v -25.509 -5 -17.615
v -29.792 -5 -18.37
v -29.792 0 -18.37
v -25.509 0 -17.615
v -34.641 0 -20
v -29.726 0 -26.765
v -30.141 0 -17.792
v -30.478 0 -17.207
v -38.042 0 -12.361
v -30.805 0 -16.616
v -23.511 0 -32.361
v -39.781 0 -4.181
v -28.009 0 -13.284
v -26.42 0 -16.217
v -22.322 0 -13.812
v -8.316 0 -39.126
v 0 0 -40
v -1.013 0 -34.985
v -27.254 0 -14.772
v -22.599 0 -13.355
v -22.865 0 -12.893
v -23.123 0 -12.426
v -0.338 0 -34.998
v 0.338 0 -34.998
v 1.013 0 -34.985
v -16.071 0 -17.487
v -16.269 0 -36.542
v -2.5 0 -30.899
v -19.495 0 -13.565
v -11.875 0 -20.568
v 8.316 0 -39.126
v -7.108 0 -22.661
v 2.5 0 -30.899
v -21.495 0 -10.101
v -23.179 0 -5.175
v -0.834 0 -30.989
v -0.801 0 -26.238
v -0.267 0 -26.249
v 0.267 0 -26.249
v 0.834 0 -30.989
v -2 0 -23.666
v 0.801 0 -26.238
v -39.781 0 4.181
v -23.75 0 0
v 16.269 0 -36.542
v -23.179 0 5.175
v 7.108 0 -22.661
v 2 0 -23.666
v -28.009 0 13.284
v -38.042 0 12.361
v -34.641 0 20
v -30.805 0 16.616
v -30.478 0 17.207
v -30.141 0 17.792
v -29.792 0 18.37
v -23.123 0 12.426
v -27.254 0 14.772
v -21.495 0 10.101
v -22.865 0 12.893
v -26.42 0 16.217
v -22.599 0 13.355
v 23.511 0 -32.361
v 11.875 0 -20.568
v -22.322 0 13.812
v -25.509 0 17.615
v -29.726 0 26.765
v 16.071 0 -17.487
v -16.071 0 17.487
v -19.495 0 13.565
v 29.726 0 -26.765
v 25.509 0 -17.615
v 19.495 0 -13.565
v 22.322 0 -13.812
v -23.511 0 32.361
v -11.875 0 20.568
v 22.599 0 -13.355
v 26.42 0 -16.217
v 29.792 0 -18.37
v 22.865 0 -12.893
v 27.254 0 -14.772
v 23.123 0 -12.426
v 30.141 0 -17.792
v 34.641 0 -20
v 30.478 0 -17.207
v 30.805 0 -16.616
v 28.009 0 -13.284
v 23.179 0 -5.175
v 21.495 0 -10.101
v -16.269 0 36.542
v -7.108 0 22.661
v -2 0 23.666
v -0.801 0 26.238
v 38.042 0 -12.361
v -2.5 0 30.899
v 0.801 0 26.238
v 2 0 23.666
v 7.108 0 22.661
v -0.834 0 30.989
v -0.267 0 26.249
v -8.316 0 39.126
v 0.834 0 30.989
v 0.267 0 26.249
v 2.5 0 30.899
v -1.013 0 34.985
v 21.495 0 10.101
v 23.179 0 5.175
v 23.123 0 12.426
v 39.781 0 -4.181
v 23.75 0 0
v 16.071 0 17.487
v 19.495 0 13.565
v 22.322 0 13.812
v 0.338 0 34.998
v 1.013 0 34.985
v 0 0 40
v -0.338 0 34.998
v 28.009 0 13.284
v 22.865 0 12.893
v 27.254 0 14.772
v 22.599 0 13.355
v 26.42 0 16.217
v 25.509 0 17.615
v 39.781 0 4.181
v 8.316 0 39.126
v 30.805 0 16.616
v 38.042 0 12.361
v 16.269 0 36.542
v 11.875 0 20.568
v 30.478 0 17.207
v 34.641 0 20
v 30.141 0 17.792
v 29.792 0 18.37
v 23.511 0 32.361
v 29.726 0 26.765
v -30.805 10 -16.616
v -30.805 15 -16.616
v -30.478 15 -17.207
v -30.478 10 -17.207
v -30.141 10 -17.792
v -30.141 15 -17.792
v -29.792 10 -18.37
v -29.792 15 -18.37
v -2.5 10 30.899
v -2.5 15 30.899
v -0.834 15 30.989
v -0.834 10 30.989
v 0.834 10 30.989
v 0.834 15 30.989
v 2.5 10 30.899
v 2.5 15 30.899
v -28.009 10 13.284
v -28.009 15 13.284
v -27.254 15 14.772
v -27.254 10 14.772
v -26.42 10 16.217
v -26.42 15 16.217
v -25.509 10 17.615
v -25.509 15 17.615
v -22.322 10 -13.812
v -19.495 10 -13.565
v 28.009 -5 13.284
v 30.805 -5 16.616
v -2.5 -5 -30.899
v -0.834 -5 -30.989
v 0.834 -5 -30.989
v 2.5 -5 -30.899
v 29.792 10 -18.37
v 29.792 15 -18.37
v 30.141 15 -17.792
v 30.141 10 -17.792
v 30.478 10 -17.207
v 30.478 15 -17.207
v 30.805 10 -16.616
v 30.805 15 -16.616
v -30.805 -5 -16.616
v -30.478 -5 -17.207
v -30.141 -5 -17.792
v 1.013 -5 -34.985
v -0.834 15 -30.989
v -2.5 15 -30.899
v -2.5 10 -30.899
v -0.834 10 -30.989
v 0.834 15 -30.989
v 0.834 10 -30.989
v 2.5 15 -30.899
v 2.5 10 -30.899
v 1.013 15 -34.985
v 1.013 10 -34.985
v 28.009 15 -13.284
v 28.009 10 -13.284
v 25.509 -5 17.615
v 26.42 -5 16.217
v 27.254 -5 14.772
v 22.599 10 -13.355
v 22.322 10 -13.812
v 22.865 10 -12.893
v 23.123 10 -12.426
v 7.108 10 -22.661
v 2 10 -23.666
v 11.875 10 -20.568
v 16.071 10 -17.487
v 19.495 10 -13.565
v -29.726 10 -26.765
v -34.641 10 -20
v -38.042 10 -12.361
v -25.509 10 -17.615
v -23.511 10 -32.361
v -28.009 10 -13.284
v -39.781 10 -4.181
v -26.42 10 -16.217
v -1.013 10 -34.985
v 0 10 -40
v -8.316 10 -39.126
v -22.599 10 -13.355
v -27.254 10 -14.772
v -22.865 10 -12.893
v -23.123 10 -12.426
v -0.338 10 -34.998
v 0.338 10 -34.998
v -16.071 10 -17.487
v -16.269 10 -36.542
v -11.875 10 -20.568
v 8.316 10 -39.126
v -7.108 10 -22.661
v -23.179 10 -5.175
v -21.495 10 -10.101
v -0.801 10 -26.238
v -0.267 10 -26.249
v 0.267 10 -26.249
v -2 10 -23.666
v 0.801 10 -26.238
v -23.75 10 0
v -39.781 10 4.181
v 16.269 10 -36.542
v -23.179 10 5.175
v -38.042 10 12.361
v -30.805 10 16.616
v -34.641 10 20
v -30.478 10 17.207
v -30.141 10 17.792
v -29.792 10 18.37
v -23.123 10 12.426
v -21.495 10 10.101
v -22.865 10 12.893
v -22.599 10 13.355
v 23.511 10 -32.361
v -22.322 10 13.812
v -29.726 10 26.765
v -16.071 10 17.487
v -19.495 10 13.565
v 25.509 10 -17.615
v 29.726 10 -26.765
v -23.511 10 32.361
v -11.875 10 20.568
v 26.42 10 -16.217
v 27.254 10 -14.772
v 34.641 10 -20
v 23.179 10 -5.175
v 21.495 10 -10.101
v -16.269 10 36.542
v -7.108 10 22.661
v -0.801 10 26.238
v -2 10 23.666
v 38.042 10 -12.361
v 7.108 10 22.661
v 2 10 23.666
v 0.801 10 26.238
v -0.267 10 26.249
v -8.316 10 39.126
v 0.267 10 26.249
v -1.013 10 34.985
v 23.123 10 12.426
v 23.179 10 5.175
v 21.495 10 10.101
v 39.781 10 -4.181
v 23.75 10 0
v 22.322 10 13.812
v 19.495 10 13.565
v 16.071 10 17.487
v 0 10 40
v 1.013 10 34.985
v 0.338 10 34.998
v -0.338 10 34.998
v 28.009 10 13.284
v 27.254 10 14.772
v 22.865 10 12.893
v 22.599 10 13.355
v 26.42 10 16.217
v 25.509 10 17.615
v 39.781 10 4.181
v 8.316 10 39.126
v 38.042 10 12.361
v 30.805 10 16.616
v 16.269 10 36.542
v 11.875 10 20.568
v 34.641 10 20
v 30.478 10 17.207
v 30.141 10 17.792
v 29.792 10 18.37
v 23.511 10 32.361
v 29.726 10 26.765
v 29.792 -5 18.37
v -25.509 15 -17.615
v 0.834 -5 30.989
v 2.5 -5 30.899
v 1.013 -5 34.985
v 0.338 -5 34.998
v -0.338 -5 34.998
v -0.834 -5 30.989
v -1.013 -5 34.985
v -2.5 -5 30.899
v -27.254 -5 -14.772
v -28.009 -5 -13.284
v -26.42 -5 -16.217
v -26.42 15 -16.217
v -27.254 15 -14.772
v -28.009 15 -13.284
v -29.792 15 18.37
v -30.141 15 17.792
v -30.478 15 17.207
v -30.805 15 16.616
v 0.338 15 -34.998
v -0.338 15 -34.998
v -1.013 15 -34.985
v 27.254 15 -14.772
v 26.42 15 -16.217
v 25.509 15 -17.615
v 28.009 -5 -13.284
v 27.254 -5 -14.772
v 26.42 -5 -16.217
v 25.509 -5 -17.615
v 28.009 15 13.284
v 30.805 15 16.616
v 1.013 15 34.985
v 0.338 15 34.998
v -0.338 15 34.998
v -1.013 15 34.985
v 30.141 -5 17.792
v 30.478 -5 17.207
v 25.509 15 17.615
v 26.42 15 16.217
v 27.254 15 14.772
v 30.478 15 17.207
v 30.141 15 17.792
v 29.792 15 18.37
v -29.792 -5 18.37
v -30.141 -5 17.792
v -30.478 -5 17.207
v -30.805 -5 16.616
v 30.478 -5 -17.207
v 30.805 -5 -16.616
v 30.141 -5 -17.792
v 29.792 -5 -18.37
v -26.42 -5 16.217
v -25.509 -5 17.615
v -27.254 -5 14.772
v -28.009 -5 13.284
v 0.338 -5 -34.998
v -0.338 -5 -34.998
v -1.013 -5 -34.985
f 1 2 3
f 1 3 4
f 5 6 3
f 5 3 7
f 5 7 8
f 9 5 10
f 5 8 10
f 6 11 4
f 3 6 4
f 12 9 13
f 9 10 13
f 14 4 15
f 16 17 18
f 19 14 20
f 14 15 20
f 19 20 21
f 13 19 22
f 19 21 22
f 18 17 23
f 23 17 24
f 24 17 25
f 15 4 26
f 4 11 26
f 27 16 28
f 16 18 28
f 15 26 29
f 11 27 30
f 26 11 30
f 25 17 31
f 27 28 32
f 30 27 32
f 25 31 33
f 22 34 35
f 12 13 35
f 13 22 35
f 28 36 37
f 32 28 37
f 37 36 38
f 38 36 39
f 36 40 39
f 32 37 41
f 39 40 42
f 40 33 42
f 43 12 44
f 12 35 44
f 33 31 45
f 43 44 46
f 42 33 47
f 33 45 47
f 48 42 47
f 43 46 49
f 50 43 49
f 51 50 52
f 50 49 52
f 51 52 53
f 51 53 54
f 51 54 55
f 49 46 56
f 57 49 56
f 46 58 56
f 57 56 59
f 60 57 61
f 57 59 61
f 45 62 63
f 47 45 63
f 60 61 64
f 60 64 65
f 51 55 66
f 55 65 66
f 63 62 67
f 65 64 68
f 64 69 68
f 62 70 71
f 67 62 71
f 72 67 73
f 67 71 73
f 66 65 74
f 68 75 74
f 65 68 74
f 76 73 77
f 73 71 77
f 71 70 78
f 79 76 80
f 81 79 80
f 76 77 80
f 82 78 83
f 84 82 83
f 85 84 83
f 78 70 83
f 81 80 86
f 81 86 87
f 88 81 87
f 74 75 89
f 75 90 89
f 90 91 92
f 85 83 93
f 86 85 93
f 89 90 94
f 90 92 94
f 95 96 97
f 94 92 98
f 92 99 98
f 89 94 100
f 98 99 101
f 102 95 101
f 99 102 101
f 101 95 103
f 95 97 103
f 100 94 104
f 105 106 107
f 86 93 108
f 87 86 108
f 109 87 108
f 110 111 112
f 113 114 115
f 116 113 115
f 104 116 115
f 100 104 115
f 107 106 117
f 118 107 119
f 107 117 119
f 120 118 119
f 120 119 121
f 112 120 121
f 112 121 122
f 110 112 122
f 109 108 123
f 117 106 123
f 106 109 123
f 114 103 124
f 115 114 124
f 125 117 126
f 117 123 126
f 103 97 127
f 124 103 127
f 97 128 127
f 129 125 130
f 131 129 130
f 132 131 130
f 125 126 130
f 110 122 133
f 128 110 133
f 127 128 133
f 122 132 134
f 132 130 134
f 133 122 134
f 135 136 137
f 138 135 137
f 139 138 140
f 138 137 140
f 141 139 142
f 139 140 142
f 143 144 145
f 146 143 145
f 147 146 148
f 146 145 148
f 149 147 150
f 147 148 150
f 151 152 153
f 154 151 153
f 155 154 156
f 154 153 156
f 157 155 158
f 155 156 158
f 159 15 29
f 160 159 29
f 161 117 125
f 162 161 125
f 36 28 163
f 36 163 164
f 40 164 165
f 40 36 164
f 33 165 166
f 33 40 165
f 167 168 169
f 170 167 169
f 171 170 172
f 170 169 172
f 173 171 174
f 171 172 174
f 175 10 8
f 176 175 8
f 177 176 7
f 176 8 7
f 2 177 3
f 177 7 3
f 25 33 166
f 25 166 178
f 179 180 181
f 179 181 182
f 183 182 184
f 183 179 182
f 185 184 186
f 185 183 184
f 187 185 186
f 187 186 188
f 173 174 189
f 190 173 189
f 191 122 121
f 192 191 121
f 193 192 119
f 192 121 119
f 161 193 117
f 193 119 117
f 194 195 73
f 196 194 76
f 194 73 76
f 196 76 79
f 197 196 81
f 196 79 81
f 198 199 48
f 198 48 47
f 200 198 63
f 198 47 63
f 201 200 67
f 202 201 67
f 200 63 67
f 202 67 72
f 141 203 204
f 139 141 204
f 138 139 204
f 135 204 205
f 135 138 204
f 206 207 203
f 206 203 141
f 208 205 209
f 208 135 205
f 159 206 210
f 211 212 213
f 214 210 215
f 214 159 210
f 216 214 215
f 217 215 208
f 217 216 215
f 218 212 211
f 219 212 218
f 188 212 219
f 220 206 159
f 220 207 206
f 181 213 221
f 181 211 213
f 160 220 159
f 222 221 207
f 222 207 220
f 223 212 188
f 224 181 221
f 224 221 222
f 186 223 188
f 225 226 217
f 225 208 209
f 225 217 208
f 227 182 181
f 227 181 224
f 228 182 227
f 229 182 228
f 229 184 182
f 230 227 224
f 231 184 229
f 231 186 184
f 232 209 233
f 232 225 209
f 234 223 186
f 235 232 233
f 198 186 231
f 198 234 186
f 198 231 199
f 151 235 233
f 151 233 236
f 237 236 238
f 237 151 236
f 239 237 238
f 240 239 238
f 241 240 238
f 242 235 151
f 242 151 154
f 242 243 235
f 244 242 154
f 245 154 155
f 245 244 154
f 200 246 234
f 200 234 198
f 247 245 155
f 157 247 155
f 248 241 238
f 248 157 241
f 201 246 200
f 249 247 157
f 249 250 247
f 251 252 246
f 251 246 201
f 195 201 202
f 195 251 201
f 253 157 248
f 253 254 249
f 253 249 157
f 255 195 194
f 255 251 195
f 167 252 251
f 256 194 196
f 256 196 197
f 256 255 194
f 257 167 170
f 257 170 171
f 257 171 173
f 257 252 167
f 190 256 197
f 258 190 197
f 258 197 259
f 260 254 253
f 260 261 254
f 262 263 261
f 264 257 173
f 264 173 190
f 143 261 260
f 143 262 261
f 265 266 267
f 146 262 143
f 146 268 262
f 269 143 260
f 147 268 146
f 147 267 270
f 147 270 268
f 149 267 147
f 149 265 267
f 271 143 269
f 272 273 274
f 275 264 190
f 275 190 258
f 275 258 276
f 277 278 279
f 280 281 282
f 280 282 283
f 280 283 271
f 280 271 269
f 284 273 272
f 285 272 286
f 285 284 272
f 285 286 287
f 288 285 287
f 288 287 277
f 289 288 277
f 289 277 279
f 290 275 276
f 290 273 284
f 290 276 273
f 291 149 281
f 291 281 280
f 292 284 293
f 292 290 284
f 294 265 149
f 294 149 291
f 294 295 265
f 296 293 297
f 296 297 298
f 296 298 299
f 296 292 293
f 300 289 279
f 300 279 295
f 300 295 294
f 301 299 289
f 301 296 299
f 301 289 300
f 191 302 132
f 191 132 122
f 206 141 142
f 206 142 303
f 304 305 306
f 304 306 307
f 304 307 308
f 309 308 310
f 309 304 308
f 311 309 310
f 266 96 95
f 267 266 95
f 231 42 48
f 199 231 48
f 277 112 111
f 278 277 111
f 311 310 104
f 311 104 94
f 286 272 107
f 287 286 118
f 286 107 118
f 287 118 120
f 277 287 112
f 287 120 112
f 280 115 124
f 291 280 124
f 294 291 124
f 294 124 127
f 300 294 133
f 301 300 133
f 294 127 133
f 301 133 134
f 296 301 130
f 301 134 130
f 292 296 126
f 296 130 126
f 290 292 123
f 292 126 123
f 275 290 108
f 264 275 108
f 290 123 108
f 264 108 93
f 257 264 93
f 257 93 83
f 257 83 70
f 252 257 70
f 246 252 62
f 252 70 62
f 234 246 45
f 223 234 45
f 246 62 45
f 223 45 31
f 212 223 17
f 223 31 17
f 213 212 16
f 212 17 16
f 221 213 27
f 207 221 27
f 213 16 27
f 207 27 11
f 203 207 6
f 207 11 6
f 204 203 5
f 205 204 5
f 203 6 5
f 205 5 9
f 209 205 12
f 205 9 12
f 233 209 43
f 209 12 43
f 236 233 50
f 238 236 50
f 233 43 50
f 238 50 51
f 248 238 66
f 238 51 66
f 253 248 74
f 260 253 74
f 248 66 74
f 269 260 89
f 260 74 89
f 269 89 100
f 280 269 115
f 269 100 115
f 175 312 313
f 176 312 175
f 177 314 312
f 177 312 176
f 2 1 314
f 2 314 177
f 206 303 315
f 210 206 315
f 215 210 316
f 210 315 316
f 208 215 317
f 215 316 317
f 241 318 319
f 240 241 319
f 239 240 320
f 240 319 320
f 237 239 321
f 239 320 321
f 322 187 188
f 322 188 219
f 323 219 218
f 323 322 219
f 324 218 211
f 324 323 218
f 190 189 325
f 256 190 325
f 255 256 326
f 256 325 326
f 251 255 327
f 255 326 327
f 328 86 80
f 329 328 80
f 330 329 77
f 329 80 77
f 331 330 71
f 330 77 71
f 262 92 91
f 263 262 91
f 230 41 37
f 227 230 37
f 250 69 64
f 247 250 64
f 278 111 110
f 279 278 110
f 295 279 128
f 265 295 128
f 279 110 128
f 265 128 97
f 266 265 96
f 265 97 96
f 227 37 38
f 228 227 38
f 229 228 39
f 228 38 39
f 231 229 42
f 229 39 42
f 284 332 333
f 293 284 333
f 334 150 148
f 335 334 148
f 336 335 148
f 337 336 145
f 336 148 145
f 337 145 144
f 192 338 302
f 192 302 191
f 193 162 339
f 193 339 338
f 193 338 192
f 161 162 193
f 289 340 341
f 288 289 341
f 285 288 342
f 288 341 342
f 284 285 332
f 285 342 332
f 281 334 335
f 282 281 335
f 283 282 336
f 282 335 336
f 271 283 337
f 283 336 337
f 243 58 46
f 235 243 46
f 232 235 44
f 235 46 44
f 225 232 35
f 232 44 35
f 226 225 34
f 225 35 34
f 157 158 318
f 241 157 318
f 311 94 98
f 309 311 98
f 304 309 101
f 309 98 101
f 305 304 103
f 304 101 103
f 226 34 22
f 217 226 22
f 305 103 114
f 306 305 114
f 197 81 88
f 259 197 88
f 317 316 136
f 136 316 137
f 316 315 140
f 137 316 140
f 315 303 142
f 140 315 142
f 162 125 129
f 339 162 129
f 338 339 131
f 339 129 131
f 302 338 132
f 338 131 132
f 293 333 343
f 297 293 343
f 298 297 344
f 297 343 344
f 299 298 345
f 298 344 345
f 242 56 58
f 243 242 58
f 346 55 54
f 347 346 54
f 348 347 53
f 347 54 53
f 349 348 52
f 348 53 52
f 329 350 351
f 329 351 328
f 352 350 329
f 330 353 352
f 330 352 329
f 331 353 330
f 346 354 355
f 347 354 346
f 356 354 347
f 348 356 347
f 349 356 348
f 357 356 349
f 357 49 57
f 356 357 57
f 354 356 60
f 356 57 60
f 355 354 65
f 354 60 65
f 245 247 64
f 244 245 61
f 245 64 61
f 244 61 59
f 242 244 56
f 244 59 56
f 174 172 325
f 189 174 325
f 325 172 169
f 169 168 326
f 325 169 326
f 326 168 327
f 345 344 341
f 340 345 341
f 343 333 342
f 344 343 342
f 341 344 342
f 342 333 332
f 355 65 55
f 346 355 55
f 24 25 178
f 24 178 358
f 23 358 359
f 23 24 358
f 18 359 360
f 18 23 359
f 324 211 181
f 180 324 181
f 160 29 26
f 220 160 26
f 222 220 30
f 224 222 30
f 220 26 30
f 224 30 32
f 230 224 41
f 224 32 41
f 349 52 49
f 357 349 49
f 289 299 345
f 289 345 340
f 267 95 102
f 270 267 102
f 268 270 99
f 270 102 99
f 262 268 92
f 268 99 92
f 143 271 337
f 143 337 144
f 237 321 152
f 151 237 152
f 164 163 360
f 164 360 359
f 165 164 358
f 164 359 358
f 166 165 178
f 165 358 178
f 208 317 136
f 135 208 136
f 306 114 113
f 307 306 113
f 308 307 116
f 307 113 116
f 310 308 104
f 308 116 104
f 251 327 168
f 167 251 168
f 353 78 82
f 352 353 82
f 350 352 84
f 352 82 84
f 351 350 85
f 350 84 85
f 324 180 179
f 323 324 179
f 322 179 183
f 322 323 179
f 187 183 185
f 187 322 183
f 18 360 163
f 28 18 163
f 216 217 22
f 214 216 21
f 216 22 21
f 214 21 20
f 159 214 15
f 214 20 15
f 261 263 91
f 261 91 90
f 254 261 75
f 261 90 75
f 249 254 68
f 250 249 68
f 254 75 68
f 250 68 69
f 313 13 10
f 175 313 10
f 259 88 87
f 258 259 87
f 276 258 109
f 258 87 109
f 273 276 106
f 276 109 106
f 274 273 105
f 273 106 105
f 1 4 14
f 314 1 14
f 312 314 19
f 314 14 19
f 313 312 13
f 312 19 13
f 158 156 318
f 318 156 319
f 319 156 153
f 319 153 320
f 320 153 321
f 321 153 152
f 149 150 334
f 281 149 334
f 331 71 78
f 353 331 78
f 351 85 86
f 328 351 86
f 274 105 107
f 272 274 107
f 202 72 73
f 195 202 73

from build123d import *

# Parameters (mm, degrees)
SKETCH1_R           = 40
BOSS_EXTRUDE1_DEPTH = 10
BOSS_EXTRUDE4_START = -10
BOSS_EXTRUDE4_DEPTH = 5
BOSS_EXTRUDE5_START = 5
BOSS_EXTRUDE5_DEPTH = 5


with BuildPart() as part:
    # Sketch1 → Boss-Extrude1 (new body)
    with BuildSketch(Plane(origin=(0, 0, 0), x_dir=(1, 0, 0), z_dir=(0, 1, 0))):
        with Locations(Location((0, 0, 0), (0, 0, 270))):
            Circle(SKETCH1_R)
        with BuildLine():
            Line((-2, 23.665639649), (-0.800587161, 26.237788783))
            ThreePointArc((-0.800587161, 26.237788783), (0, 26.25), (0.800587161, 26.237788783))
            Line((0.800587161, 26.237788783), (2, 23.665639649))
            ThreePointArc((2, 23.665639649), (11.875, 20.56810334), (19.495045133, 13.564870632))
            Line((19.495045133, 13.564870632), (22.322298044, 13.812223211))
            ThreePointArc((22.322298044, 13.812223211), (22.733166849, 13.125), (23.122885205, 12.425565572))
            Line((23.122885205, 12.425565572), (21.495045133, 10.100769017))
            ThreePointArc((21.495045133, 10.100769017), (23.75, 0), (21.495045133, -10.100769017))
            Line((21.495045133, -10.100769017), (23.122885205, -12.425565572))
            ThreePointArc((23.122885205, -12.425565572), (22.733166849, -13.125), (22.322298044, -13.812223211))
            Line((22.322298044, -13.812223211), (19.495045133, -13.564870632))
            ThreePointArc((19.495045133, -13.564870632), (11.875, -20.56810334), (2, -23.665639649))
            Line((2, -23.665639649), (0.800587161, -26.237788783))
            ThreePointArc((0.800587161, -26.237788783), (0, -26.25), (-0.800587161, -26.237788783))
            Line((-0.800587161, -26.237788783), (-2, -23.665639649))
            ThreePointArc((-2, -23.665639649), (-11.875, -20.56810334), (-19.495045133, -13.564870632))
            Line((-19.495045133, -13.564870632), (-22.322298044, -13.812223211))
            ThreePointArc((-22.322298044, -13.812223211), (-22.733166849, -13.125), (-23.122885205, -12.425565572))
            Line((-23.122885205, -12.425565572), (-21.495045133, -10.100769017))
            ThreePointArc((-21.495045133, -10.100769017), (-23.75, 0), (-21.495045133, 10.100769017))
            Line((-21.495045133, 10.100769017), (-23.122885205, 12.425565572))
            ThreePointArc((-23.122885205, 12.425565572), (-22.733166849, 13.125), (-22.322298044, 13.812223211))
            Line((-22.322298044, 13.812223211), (-19.495045133, 13.564870632))
            ThreePointArc((-19.495045133, 13.564870632), (-11.875, 20.56810334), (-2, 23.665639649))
        make_face(mode=Mode.SUBTRACT)
    extrude(amount=BOSS_EXTRUDE1_DEPTH)

    # 1,2,3 → Boss-Extrude4 (add)
    with BuildSketch(Plane(origin=(0, 10, 0), x_dir=(1, 0, 0), z_dir=(0, 1, 0)).offset(BOSS_EXTRUDE4_START)):
        with BuildLine():
            Line((2.5, 30.899029111), (1.012702288, 34.985345991))
            ThreePointArc((1.012702288, 34.985345991), (0, 35), (-1.012702288, 34.985345991))
            Line((-1.012702288, 34.985345991), (-2.5, 30.899029111))
            ThreePointArc((-2.5, 30.899029111), (0, 31), (2.5, 30.899029111))
        make_face()
        with BuildLine():
            Line((25.509344162, 17.614578065), (29.791847244, 18.369698903))
            ThreePointArc((29.791847244, 18.369698903), (30.310889132, 17.5), (30.804549532, 16.615647087))
            Line((30.804549532, 16.615647087), (28.009344162, 13.284451046))
            ThreePointArc((28.009344162, 13.284451046), (26.846787517, 15.5), (25.509344162, 17.614578065))
        make_face()
        with BuildLine():
            Line((28.009344162, -13.284451046), (30.804549532, -16.615647087))
            ThreePointArc((30.804549532, -16.615647087), (30.310889132, -17.5), (29.791847244, -18.369698903))
            Line((29.791847244, -18.369698903), (25.509344162, -17.614578065))
            ThreePointArc((25.509344162, -17.614578065), (26.846787517, -15.5), (28.009344162, -13.284451046))
        make_face()
        with BuildLine():
            Line((2.5, -30.899029111), (1.012702288, -34.985345991))
            ThreePointArc((1.012702288, -34.985345991), (0, -35), (-1.012702288, -34.985345991))
            Line((-1.012702288, -34.985345991), (-2.5, -30.899029111))
            ThreePointArc((-2.5, -30.899029111), (0, -31), (2.5, -30.899029111))
        make_face()
        with BuildLine():
            Line((-25.509344162, -17.614578065), (-29.791847244, -18.369698903))
            ThreePointArc((-29.791847244, -18.369698903), (-30.310889132, -17.5), (-30.804549532, -16.615647087))
            Line((-30.804549532, -16.615647087), (-28.009344162, -13.284451046))
            ThreePointArc((-28.009344162, -13.284451046), (-26.846787517, -15.5), (-25.509344162, -17.614578065))
        make_face()
        with BuildLine():
            Line((-28.009344162, 13.284451046), (-30.804549532, 16.615647087))
            ThreePointArc((-30.804549532, 16.615647087), (-30.310889132, 17.5), (-29.791847244, 18.369698903))
            Line((-29.791847244, 18.369698903), (-25.509344162, 17.614578065))
            ThreePointArc((-25.509344162, 17.614578065), (-26.846787517, 15.5), (-28.009344162, 13.284451046))
        make_face()
    extrude(amount=-BOSS_EXTRUDE4_DEPTH)

    # 1,2,3<2> → Boss-Extrude5 (add)
    with BuildSketch(Plane(origin=(0, 10, 0), x_dir=(1, 0, 0), z_dir=(0, 1, 0)).offset(BOSS_EXTRUDE5_START)):
        with BuildLine():
            Line((2.5, 30.899029111), (1.012702288, 34.985345991))
            ThreePointArc((1.012702288, 34.985345991), (0, 35), (-1.012702288, 34.985345991))
            Line((-1.012702288, 34.985345991), (-2.5, 30.899029111))
            ThreePointArc((-2.5, 30.899029111), (0, 31), (2.5, 30.899029111))
        make_face()
        with BuildLine():
            Line((25.509344162, 17.614578065), (29.791847244, 18.369698903))
            ThreePointArc((29.791847244, 18.369698903), (30.310889132, 17.5), (30.804549532, 16.615647087))
            Line((30.804549532, 16.615647087), (28.009344162, 13.284451046))
            ThreePointArc((28.009344162, 13.284451046), (26.846787517, 15.5), (25.509344162, 17.614578065))
        make_face()
        with BuildLine():
            Line((28.009344162, -13.284451046), (30.804549532, -16.615647087))
            ThreePointArc((30.804549532, -16.615647087), (30.310889132, -17.5), (29.791847244, -18.369698903))
            Line((29.791847244, -18.369698903), (25.509344162, -17.614578065))
            ThreePointArc((25.509344162, -17.614578065), (26.846787517, -15.5), (28.009344162, -13.284451046))
        make_face()
        with BuildLine():
            Line((2.5, -30.899029111), (1.012702288, -34.985345991))
            ThreePointArc((1.012702288, -34.985345991), (0, -35), (-1.012702288, -34.985345991))
            Line((-1.012702288, -34.985345991), (-2.5, -30.899029111))
            ThreePointArc((-2.5, -30.899029111), (0, -31), (2.5, -30.899029111))
        make_face()
        with BuildLine():
            Line((-25.509344162, -17.614578065), (-29.791847244, -18.369698903))
            ThreePointArc((-29.791847244, -18.369698903), (-30.310889132, -17.5), (-30.804549532, -16.615647087))
            Line((-30.804549532, -16.615647087), (-28.009344162, -13.284451046))
            ThreePointArc((-28.009344162, -13.284451046), (-26.846787517, -15.5), (-25.509344162, -17.614578065))
        make_face()
        with BuildLine():
            Line((-28.009344162, 13.284451046), (-30.804549532, 16.615647087))
            ThreePointArc((-30.804549532, 16.615647087), (-30.310889132, 17.5), (-29.791847244, 18.369698903))
            Line((-29.791847244, 18.369698903), (-25.509344162, 17.614578065))
            ThreePointArc((-25.509344162, 17.614578065), (-26.846787517, 15.5), (-28.009344162, 13.284451046))
        make_face()
    extrude(amount=-BOSS_EXTRUDE5_DEPTH)


solid = part.part
